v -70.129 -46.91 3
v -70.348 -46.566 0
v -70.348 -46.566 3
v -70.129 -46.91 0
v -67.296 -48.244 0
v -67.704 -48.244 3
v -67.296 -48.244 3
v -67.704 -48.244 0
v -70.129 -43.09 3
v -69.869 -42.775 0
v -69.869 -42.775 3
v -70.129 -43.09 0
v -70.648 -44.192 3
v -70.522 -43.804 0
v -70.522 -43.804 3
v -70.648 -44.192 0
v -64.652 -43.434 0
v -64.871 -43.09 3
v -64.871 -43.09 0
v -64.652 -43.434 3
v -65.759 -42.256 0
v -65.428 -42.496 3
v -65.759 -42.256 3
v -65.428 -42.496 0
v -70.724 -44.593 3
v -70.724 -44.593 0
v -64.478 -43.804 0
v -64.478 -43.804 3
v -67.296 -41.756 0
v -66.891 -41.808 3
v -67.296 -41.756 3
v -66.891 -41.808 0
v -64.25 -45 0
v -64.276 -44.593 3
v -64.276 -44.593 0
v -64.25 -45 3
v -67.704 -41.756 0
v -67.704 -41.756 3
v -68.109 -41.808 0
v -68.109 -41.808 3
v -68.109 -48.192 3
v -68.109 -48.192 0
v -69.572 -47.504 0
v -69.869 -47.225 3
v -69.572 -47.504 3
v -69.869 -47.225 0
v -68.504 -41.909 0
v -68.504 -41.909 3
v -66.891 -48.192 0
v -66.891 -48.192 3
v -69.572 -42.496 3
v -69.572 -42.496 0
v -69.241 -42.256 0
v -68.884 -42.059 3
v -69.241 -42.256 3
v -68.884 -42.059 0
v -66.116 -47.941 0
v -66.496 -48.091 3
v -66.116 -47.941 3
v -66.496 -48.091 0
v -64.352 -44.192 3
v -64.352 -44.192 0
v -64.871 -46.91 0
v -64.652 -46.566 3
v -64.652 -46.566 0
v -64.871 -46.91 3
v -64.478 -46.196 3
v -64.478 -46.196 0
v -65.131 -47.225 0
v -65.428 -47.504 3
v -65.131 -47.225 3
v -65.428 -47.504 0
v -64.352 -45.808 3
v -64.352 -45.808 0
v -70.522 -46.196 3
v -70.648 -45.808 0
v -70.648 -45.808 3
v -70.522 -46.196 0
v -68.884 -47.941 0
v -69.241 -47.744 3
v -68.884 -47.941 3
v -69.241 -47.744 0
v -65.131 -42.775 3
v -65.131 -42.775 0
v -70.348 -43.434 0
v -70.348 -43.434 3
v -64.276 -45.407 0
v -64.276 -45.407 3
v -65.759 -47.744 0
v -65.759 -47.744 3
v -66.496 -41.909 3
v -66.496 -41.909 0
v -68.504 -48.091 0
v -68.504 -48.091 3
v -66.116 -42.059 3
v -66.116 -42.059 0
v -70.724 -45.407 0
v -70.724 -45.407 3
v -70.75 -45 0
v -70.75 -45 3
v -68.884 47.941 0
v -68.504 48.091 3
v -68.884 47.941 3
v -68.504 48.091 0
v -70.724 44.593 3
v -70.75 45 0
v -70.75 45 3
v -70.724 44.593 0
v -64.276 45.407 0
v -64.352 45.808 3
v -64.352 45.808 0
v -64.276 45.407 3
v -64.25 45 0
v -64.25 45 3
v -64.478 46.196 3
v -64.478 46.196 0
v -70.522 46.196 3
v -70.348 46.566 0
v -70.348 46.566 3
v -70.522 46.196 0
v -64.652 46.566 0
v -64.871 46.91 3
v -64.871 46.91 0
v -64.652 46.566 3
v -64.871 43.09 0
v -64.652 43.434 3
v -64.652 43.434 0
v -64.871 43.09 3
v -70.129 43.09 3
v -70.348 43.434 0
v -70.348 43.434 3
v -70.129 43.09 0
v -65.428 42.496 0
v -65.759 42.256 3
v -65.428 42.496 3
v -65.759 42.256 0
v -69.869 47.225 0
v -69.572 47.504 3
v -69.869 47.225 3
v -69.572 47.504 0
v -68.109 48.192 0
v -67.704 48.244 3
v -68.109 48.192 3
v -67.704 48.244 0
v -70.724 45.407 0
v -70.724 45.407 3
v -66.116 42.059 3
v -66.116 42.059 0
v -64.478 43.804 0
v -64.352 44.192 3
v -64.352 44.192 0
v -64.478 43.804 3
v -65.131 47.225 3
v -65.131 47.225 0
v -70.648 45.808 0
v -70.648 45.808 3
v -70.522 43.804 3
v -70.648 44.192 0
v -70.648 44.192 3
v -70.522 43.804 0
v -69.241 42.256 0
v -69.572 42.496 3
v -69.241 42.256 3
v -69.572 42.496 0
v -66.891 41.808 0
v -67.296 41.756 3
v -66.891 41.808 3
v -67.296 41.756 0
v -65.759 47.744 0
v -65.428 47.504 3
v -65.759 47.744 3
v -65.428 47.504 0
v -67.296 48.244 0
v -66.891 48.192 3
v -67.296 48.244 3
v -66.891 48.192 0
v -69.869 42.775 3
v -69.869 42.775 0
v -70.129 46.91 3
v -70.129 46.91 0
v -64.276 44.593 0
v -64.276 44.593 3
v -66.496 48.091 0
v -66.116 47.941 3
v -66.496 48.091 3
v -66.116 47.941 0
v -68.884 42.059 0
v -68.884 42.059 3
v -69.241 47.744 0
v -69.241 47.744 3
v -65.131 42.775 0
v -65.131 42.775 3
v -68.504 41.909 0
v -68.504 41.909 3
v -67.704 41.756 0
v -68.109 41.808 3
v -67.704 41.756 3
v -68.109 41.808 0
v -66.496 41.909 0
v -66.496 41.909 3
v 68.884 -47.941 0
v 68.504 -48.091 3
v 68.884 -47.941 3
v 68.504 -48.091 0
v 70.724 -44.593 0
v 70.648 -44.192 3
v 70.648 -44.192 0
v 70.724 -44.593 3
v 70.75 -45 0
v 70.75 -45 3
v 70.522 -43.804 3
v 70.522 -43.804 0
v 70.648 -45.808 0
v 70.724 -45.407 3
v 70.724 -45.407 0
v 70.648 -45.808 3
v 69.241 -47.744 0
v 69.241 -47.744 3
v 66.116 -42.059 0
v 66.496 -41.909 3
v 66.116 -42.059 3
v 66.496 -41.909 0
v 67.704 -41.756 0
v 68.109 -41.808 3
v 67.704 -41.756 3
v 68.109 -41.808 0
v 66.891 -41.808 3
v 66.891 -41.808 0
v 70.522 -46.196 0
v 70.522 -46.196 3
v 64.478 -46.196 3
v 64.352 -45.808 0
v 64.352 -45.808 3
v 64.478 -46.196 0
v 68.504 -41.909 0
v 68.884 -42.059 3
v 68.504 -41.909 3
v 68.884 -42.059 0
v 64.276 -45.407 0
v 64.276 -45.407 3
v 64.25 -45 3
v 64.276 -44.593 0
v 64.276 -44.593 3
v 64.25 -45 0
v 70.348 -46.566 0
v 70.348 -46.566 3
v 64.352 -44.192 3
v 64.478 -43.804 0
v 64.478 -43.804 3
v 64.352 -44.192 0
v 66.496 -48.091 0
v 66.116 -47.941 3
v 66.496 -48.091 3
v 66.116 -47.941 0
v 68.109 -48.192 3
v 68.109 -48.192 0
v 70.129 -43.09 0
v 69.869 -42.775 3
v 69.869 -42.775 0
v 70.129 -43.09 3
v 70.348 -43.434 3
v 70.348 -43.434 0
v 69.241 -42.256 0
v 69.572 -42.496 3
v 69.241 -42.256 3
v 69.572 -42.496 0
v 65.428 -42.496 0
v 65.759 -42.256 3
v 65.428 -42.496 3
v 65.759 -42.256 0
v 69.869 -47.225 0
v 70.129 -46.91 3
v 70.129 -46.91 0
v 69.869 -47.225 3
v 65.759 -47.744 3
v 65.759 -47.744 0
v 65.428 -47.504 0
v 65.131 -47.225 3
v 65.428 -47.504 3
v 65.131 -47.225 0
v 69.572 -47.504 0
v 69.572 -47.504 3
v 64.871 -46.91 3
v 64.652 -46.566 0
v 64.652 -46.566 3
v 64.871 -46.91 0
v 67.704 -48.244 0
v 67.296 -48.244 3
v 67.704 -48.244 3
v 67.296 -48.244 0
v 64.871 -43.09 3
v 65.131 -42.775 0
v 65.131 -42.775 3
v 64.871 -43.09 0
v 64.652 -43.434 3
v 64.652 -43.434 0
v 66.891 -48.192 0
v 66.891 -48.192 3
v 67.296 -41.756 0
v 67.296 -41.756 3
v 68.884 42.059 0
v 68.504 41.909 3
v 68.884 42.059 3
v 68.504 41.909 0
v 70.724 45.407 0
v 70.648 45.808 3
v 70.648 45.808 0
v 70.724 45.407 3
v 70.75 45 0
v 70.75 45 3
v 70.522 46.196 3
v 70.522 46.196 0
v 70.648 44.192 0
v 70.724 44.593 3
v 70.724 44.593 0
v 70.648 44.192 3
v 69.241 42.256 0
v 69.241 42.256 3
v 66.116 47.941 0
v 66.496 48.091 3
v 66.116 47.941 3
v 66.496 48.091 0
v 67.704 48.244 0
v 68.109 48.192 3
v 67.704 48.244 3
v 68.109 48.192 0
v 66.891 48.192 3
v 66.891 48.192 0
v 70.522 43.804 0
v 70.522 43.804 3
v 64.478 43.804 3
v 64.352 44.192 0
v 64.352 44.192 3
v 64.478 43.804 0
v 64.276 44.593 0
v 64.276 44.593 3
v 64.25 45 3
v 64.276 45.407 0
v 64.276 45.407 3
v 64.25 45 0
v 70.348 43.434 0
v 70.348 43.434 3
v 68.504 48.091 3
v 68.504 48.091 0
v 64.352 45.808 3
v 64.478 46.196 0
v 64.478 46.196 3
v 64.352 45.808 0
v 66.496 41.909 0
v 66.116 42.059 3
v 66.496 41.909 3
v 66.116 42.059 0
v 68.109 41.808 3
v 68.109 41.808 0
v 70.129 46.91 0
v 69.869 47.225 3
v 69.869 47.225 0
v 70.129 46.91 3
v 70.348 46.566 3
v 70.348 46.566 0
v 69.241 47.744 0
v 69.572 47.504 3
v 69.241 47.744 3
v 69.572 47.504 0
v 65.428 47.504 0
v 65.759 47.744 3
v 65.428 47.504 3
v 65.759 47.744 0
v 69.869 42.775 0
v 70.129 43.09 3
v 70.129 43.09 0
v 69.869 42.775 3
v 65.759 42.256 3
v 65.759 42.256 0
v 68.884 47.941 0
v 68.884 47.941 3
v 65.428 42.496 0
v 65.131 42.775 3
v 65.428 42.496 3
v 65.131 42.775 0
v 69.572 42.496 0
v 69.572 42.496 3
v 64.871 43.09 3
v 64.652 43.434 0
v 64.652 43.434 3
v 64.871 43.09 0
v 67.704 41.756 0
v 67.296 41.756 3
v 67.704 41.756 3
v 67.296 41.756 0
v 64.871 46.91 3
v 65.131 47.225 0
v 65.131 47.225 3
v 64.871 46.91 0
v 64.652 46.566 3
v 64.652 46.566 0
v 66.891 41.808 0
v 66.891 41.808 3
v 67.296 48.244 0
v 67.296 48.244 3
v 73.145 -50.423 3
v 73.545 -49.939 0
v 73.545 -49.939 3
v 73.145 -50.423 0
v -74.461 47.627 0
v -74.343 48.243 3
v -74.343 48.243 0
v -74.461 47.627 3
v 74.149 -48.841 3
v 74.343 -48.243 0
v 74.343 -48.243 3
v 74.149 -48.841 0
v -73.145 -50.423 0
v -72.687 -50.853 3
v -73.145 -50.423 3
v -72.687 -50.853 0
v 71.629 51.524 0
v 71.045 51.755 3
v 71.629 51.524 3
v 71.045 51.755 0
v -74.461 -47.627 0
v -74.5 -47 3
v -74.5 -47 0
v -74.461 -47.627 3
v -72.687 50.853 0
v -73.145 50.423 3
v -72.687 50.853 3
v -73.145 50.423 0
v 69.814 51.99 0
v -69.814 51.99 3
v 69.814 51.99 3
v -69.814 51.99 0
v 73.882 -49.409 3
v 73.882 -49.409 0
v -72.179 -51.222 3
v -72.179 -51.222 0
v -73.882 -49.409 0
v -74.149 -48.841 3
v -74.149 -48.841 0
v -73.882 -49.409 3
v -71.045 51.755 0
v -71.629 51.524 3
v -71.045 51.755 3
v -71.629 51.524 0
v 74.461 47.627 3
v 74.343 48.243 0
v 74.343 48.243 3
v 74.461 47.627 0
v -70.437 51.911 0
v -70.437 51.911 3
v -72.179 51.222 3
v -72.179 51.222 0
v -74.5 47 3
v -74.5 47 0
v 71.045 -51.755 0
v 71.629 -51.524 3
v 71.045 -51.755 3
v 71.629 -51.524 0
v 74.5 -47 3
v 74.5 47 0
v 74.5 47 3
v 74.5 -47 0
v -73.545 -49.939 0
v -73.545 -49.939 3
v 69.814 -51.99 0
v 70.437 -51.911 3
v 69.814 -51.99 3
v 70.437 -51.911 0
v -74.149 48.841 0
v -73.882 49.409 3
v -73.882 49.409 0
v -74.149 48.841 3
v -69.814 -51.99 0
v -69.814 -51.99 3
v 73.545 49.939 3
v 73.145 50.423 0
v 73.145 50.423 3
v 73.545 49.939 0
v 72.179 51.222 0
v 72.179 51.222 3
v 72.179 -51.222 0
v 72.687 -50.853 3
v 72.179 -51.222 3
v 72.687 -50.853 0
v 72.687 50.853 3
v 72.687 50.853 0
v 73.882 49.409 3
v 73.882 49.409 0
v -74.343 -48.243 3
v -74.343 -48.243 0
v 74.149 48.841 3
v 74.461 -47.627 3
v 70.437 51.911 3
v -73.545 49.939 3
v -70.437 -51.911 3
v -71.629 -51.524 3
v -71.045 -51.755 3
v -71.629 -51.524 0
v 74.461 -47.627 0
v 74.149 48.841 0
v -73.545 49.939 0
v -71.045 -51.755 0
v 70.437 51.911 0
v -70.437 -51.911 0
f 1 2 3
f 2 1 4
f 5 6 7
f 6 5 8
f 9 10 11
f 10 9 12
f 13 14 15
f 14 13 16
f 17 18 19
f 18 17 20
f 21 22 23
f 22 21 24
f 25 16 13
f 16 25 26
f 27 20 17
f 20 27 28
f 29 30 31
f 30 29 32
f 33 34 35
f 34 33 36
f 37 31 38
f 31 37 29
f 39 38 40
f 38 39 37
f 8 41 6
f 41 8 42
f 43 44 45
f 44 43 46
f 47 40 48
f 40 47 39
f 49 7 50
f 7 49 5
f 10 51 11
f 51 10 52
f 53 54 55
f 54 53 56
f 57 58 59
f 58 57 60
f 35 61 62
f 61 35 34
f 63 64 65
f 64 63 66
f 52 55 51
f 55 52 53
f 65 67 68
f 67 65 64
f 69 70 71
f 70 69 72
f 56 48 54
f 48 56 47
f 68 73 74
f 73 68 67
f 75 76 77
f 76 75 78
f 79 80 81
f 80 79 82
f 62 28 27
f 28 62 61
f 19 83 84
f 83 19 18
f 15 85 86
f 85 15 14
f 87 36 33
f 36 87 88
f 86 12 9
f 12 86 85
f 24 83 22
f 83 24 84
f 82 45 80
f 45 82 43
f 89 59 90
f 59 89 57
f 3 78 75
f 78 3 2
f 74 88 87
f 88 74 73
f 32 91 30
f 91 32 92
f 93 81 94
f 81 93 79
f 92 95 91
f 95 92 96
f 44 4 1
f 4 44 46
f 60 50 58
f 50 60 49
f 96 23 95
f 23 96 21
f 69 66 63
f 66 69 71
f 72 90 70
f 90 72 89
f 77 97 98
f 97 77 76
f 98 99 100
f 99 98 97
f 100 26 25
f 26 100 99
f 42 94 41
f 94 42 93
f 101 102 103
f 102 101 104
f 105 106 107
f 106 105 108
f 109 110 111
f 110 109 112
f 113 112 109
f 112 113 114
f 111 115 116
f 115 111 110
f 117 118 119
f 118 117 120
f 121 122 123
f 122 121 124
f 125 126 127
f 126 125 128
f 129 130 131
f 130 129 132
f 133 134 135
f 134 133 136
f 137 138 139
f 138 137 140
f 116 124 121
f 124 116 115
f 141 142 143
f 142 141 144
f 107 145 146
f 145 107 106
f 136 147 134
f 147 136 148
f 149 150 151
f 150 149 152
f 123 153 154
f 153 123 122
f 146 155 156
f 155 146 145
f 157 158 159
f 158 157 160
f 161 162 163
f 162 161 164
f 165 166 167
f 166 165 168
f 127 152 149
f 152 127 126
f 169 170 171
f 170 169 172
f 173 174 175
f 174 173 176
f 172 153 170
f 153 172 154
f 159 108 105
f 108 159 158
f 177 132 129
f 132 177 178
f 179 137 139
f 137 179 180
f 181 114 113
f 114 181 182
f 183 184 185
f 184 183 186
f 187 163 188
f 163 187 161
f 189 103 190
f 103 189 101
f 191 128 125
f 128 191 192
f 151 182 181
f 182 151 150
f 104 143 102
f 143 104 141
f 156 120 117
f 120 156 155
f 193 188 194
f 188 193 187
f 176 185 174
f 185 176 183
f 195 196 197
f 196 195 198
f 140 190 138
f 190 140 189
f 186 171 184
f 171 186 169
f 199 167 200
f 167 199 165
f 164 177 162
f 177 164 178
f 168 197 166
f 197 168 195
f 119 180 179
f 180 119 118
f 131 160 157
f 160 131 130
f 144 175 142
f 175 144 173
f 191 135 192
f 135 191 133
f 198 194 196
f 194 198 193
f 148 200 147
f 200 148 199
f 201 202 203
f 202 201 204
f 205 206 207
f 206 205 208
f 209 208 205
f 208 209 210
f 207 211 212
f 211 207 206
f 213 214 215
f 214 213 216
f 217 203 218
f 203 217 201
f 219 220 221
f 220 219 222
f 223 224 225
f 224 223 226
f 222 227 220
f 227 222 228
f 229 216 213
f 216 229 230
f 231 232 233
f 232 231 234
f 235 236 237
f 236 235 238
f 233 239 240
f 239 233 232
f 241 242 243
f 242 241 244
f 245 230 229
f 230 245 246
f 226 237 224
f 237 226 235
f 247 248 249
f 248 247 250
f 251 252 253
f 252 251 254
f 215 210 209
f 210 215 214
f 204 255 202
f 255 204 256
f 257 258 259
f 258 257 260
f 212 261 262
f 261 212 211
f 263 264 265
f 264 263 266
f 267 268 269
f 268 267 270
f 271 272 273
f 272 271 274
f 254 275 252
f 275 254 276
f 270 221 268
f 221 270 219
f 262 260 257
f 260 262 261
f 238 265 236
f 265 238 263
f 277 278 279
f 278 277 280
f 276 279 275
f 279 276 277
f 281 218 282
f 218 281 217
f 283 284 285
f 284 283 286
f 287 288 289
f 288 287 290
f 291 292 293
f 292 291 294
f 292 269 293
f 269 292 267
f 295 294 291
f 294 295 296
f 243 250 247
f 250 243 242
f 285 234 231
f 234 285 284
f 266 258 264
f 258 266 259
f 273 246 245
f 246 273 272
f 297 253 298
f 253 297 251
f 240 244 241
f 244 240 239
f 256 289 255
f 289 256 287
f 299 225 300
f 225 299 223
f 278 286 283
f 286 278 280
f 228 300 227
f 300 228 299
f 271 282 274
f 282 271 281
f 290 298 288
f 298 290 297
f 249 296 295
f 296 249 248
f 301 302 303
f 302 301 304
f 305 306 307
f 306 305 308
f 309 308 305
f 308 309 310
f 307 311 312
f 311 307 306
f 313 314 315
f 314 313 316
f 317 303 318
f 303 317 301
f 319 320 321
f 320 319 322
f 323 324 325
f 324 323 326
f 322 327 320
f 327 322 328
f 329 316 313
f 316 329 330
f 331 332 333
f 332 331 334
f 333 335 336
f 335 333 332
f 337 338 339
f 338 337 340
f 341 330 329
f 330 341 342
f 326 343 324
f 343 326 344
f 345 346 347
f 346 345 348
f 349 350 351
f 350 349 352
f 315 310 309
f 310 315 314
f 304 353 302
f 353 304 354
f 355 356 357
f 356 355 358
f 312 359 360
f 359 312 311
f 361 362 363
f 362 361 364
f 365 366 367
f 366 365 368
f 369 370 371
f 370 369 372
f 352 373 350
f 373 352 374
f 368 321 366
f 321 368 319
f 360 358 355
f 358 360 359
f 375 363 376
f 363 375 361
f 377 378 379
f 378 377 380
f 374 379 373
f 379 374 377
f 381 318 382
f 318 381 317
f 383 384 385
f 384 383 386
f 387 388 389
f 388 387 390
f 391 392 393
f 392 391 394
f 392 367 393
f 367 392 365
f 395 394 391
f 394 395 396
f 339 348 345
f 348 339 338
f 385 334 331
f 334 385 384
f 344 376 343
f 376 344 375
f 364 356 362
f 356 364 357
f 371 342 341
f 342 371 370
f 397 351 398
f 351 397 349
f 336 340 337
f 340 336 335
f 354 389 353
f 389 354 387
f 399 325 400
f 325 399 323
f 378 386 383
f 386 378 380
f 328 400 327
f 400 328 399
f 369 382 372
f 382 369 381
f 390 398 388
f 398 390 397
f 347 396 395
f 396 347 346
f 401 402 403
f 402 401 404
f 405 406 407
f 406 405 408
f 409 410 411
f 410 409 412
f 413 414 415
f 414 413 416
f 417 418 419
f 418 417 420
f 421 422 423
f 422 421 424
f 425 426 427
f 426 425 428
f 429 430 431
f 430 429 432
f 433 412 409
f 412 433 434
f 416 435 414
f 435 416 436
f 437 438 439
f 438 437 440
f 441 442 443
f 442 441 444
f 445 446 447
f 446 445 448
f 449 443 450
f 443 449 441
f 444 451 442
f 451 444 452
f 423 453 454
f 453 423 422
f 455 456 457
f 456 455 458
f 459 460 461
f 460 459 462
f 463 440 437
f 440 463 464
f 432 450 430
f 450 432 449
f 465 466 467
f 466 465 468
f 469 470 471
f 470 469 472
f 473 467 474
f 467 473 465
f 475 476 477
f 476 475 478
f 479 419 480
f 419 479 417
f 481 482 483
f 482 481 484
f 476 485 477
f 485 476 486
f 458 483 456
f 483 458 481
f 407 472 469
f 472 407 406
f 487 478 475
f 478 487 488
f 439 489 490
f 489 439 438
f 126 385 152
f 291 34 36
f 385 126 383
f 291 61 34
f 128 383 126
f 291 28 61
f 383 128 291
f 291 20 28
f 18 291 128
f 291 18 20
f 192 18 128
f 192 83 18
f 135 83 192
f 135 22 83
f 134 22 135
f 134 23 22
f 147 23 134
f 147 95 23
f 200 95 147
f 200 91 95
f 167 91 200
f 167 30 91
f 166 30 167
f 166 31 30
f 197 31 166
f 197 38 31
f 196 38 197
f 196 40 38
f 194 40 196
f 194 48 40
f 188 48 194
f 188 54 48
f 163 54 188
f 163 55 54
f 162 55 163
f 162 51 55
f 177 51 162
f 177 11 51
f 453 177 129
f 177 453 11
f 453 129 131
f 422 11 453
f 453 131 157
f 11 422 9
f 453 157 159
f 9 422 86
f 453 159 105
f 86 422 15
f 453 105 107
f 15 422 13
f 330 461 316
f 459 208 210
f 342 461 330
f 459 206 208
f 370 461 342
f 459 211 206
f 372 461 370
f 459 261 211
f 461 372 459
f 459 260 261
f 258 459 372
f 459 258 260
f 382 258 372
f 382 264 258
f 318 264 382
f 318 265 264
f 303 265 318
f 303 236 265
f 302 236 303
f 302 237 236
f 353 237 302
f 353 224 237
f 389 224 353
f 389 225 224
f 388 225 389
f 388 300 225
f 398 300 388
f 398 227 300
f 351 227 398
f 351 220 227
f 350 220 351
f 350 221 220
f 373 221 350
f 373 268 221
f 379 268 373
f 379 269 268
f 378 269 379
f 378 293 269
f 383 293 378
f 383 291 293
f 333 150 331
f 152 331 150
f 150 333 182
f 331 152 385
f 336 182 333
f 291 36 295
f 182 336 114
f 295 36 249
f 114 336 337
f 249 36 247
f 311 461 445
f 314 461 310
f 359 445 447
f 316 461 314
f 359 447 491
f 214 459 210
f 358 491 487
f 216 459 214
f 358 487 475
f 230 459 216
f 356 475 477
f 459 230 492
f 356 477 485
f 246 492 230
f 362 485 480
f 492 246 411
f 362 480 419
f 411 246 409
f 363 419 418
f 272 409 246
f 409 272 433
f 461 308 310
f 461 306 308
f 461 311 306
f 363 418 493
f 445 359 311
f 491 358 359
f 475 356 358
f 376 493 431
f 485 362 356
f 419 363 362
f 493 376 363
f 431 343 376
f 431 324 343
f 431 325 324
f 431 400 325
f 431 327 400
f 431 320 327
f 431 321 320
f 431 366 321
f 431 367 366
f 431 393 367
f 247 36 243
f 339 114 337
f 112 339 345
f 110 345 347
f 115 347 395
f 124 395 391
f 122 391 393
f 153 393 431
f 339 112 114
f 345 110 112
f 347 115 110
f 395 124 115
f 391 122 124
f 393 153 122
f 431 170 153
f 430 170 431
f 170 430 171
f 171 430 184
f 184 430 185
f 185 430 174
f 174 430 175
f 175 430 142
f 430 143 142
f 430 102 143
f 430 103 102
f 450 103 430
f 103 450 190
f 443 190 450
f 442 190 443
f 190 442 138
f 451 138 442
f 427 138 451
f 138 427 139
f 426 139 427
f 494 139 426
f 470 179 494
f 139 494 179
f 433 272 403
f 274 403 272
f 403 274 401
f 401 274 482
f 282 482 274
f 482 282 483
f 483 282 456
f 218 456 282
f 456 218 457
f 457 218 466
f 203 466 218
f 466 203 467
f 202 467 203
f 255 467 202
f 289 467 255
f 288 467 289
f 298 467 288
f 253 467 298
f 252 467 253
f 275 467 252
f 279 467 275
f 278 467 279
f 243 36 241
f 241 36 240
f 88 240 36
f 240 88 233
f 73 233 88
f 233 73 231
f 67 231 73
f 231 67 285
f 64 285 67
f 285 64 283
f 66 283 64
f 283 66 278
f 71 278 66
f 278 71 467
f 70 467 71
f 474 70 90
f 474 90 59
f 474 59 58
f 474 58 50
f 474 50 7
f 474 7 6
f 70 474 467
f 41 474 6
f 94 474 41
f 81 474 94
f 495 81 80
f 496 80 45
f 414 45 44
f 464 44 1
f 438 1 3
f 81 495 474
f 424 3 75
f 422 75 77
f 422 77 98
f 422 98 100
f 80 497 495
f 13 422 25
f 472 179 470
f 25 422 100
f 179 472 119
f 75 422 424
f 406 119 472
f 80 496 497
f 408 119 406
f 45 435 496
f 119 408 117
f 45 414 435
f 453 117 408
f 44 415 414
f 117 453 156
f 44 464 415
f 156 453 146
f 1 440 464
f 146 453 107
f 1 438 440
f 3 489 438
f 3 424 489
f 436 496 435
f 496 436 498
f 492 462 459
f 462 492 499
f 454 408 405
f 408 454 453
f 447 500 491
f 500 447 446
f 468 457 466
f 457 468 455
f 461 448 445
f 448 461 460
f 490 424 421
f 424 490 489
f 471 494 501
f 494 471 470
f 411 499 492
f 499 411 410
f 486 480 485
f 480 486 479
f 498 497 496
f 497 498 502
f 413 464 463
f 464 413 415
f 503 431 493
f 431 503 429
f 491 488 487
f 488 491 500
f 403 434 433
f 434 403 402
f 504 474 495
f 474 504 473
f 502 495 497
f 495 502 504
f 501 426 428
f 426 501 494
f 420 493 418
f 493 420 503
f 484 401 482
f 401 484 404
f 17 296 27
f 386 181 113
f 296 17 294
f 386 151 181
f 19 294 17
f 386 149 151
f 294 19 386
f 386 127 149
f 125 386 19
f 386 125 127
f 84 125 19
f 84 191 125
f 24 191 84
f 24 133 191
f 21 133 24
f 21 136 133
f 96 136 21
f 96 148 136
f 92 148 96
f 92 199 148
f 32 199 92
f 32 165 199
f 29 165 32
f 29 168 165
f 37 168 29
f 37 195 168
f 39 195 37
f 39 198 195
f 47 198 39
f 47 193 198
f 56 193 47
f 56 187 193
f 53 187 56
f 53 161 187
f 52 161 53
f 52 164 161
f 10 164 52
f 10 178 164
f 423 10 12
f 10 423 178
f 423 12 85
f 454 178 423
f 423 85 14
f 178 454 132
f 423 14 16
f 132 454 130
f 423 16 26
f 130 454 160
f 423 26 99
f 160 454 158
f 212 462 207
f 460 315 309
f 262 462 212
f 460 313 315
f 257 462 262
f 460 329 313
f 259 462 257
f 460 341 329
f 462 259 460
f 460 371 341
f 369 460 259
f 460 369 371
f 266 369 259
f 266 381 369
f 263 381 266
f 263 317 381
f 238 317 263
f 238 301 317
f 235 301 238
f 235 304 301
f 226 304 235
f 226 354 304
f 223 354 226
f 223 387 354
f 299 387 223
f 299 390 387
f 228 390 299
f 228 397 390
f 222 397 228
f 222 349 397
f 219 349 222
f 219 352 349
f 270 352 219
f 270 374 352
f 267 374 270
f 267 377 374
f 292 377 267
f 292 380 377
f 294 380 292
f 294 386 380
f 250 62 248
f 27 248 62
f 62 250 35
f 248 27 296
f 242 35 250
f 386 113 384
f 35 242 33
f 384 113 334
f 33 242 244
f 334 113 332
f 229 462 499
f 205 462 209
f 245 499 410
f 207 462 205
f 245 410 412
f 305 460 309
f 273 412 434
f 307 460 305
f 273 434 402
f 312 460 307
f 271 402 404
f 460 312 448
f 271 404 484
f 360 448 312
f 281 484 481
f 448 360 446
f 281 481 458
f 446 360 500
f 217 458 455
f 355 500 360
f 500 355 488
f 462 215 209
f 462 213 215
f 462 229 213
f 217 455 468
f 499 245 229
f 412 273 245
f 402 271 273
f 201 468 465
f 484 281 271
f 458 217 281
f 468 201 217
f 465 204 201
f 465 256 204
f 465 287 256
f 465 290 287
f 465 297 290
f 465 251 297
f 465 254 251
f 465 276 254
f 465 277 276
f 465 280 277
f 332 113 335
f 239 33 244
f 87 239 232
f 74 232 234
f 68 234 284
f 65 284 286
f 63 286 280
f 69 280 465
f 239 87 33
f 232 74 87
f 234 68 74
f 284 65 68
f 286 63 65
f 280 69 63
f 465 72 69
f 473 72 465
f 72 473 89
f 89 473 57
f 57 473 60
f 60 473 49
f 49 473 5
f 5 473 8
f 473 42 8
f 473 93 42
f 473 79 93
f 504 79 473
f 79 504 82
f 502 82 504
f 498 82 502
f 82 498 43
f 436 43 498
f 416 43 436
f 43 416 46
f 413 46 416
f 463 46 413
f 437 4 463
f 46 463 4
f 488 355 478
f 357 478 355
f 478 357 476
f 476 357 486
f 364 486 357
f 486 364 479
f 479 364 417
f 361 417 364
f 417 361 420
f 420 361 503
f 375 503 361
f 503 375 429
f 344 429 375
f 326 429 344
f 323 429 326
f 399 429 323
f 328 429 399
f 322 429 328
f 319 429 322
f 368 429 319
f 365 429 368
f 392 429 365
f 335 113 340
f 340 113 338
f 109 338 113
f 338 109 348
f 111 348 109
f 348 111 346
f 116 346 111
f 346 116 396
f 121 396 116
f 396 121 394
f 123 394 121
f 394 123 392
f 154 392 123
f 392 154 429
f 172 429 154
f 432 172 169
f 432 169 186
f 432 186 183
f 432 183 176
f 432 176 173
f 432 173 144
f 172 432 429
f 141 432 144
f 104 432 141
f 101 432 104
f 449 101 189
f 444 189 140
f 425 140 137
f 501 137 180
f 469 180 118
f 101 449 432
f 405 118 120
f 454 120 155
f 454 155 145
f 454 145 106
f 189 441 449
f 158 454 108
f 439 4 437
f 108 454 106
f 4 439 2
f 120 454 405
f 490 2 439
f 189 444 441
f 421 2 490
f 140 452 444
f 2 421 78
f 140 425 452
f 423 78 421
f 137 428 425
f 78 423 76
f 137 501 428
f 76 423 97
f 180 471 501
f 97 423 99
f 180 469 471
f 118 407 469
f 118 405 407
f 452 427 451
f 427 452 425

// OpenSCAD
$fn = 50;


difference() {
	union() {
		hull() {
			translate(v = [-69.5000000000, 47.0000000000, 0]) {
				cylinder(h = 3, r = 5);
			}
			translate(v = [69.5000000000, 47.0000000000, 0]) {
				cylinder(h = 3, r = 5);
			}
			translate(v = [-69.5000000000, -47.0000000000, 0]) {
				cylinder(h = 3, r = 5);
			}
			translate(v = [69.5000000000, -47.0000000000, 0]) {
				cylinder(h = 3, r = 5);
			}
		}
	}
	union() {
		translate(v = [-67.5000000000, -45.0000000000, -100.0000000000]) {
			cylinder(h = 200, r = 3.2500000000);
		}
		translate(v = [-67.5000000000, 45.0000000000, -100.0000000000]) {
			cylinder(h = 200, r = 3.2500000000);
		}
		translate(v = [67.5000000000, -45.0000000000, -100.0000000000]) {
			cylinder(h = 200, r = 3.2500000000);
		}
		translate(v = [67.5000000000, 45.0000000000, -100.0000000000]) {
			cylinder(h = 200, r = 3.2500000000);
		}
	}
}
